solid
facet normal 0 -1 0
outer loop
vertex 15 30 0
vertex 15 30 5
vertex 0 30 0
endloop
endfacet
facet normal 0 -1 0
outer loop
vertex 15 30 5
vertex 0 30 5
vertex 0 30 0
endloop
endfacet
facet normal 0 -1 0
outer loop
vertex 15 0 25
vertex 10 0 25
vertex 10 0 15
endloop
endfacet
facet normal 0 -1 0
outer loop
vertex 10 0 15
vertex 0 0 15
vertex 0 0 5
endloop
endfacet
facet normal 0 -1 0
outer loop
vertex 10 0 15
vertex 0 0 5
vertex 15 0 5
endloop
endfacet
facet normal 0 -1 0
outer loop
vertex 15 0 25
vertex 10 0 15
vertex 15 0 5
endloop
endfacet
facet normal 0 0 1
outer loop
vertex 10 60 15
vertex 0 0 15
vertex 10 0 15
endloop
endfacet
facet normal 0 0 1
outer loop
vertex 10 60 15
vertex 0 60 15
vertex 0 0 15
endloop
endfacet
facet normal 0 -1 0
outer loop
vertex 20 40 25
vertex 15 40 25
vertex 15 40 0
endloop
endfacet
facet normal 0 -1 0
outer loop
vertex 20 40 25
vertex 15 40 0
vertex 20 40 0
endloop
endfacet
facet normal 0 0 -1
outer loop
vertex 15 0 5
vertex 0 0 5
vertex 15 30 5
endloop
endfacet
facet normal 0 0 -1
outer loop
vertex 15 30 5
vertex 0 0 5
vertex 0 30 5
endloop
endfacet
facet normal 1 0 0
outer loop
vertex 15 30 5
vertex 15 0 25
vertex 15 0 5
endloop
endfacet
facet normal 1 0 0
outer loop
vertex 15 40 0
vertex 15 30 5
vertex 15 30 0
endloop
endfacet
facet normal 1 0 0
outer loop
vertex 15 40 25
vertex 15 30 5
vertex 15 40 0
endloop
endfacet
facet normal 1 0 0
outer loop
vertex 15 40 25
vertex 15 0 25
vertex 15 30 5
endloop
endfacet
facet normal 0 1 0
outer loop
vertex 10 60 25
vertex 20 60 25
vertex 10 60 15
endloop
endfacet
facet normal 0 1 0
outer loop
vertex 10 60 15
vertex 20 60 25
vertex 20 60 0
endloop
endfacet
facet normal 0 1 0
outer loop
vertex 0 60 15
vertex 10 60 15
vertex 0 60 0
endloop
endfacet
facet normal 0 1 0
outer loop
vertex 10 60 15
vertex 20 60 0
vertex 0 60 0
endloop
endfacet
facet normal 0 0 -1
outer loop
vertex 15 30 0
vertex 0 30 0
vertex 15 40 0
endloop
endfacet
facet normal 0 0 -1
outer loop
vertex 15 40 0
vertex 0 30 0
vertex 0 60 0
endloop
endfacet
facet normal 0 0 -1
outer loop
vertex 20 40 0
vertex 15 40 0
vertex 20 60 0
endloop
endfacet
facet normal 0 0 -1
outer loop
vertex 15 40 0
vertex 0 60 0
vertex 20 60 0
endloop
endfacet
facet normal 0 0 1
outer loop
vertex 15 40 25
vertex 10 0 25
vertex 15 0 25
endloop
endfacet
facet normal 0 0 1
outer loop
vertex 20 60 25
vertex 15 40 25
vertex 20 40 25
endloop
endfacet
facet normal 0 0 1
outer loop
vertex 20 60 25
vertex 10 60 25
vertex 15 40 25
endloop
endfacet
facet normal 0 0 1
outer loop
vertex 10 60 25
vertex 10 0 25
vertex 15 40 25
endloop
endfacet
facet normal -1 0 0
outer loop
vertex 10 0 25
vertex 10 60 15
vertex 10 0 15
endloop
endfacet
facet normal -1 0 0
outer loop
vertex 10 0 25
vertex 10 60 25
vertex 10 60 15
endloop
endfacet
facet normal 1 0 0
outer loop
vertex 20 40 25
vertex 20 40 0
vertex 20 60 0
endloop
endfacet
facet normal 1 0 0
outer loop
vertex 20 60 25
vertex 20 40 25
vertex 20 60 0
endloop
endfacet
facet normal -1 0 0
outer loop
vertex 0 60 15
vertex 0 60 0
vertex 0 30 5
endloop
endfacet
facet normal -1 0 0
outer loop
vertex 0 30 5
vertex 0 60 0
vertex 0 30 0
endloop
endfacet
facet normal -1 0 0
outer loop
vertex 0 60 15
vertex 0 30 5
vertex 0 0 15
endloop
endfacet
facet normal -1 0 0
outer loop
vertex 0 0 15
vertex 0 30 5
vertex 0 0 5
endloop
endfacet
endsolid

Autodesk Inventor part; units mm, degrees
ref_plane "YZ Plane" through (0, 0, 0) normal (1, 0, 0) x (0, 1, 0)
ref_plane "XZ Plane" through (0, 0, 0) normal (0, 1, 0) x (-1, 0, 0)
ref_plane "XY Plane" through (0, 0, 0) normal (0, 0, 1) x (1, 0, 0)
sketch "Náčrt1" plane through (0, 0, 0) normal (0, 0, 1) x (1, 0, 0)
  line L0 (0, 0) -> (20, 0)
  line L1 (20, 0) -> (20, 60)
  line L2 (20, 60) -> (0, 60)
  line L3 (0, 60) -> (0, 0)
  dimension "d0" = 20
  dimension "d1" = 60
extrude "Vysunutí1" add sketch "Náčrt1" along normal blind 25
sketch "Náčrt2" plane through (0, 0, 25) normal (0, 0, 1) x (1, 0, 0)
  line L0 (20, 60) -> (0, 60) projected
  line L1 (0, 0) -> (20, 0) projected
  line L2 (0, 60) -> (10, 60)
  line L3 (10, 60) -> (10, 0)
  line L4 (10, 0) -> (0, 0)
  line L5 (0, 0) -> (0, 60)
  dimension "d4" = 10
extrude "Vysunutí2" cut sketch "Náčrt2" against normal blind 10
sketch "Náčrt3" plane through (0, 0, 0) normal (-1, 0, 0) x (0, 0, 1)
  line L0 (0, 0) -> (25, 0) projected
  line L1 (0, 0) -> (5, 0)
  line L2 (5, 0) -> (5, 30)
  line L3 (5, 30) -> (0, 30)
  line L4 (0, 30) -> (0, 0)
  dimension "d7" = 5
  dimension "d8" = 30
extrude "Vysunutí3" cut sketch "Náčrt3" against normal through all
sketch "Náčrt4" plane through (0, 0, 25) normal (0, 0, 1) x (1, 0, 0)
  line L0 (20, 0) -> (20, 60) projected
  line L1 (20, 0) -> (15, 0)
  line L2 (15, 0) -> (15, 40)
  line L3 (15, 40) -> (20, 40)
  line L4 (20, 40) -> (20, 0)
  point P0 (0, 0)
  dimension "d11" = 5
  dimension "d12" = 40
extrude "Vysunutí4" cut sketch "Náčrt4" against normal through all
properties part number "Součást3"
